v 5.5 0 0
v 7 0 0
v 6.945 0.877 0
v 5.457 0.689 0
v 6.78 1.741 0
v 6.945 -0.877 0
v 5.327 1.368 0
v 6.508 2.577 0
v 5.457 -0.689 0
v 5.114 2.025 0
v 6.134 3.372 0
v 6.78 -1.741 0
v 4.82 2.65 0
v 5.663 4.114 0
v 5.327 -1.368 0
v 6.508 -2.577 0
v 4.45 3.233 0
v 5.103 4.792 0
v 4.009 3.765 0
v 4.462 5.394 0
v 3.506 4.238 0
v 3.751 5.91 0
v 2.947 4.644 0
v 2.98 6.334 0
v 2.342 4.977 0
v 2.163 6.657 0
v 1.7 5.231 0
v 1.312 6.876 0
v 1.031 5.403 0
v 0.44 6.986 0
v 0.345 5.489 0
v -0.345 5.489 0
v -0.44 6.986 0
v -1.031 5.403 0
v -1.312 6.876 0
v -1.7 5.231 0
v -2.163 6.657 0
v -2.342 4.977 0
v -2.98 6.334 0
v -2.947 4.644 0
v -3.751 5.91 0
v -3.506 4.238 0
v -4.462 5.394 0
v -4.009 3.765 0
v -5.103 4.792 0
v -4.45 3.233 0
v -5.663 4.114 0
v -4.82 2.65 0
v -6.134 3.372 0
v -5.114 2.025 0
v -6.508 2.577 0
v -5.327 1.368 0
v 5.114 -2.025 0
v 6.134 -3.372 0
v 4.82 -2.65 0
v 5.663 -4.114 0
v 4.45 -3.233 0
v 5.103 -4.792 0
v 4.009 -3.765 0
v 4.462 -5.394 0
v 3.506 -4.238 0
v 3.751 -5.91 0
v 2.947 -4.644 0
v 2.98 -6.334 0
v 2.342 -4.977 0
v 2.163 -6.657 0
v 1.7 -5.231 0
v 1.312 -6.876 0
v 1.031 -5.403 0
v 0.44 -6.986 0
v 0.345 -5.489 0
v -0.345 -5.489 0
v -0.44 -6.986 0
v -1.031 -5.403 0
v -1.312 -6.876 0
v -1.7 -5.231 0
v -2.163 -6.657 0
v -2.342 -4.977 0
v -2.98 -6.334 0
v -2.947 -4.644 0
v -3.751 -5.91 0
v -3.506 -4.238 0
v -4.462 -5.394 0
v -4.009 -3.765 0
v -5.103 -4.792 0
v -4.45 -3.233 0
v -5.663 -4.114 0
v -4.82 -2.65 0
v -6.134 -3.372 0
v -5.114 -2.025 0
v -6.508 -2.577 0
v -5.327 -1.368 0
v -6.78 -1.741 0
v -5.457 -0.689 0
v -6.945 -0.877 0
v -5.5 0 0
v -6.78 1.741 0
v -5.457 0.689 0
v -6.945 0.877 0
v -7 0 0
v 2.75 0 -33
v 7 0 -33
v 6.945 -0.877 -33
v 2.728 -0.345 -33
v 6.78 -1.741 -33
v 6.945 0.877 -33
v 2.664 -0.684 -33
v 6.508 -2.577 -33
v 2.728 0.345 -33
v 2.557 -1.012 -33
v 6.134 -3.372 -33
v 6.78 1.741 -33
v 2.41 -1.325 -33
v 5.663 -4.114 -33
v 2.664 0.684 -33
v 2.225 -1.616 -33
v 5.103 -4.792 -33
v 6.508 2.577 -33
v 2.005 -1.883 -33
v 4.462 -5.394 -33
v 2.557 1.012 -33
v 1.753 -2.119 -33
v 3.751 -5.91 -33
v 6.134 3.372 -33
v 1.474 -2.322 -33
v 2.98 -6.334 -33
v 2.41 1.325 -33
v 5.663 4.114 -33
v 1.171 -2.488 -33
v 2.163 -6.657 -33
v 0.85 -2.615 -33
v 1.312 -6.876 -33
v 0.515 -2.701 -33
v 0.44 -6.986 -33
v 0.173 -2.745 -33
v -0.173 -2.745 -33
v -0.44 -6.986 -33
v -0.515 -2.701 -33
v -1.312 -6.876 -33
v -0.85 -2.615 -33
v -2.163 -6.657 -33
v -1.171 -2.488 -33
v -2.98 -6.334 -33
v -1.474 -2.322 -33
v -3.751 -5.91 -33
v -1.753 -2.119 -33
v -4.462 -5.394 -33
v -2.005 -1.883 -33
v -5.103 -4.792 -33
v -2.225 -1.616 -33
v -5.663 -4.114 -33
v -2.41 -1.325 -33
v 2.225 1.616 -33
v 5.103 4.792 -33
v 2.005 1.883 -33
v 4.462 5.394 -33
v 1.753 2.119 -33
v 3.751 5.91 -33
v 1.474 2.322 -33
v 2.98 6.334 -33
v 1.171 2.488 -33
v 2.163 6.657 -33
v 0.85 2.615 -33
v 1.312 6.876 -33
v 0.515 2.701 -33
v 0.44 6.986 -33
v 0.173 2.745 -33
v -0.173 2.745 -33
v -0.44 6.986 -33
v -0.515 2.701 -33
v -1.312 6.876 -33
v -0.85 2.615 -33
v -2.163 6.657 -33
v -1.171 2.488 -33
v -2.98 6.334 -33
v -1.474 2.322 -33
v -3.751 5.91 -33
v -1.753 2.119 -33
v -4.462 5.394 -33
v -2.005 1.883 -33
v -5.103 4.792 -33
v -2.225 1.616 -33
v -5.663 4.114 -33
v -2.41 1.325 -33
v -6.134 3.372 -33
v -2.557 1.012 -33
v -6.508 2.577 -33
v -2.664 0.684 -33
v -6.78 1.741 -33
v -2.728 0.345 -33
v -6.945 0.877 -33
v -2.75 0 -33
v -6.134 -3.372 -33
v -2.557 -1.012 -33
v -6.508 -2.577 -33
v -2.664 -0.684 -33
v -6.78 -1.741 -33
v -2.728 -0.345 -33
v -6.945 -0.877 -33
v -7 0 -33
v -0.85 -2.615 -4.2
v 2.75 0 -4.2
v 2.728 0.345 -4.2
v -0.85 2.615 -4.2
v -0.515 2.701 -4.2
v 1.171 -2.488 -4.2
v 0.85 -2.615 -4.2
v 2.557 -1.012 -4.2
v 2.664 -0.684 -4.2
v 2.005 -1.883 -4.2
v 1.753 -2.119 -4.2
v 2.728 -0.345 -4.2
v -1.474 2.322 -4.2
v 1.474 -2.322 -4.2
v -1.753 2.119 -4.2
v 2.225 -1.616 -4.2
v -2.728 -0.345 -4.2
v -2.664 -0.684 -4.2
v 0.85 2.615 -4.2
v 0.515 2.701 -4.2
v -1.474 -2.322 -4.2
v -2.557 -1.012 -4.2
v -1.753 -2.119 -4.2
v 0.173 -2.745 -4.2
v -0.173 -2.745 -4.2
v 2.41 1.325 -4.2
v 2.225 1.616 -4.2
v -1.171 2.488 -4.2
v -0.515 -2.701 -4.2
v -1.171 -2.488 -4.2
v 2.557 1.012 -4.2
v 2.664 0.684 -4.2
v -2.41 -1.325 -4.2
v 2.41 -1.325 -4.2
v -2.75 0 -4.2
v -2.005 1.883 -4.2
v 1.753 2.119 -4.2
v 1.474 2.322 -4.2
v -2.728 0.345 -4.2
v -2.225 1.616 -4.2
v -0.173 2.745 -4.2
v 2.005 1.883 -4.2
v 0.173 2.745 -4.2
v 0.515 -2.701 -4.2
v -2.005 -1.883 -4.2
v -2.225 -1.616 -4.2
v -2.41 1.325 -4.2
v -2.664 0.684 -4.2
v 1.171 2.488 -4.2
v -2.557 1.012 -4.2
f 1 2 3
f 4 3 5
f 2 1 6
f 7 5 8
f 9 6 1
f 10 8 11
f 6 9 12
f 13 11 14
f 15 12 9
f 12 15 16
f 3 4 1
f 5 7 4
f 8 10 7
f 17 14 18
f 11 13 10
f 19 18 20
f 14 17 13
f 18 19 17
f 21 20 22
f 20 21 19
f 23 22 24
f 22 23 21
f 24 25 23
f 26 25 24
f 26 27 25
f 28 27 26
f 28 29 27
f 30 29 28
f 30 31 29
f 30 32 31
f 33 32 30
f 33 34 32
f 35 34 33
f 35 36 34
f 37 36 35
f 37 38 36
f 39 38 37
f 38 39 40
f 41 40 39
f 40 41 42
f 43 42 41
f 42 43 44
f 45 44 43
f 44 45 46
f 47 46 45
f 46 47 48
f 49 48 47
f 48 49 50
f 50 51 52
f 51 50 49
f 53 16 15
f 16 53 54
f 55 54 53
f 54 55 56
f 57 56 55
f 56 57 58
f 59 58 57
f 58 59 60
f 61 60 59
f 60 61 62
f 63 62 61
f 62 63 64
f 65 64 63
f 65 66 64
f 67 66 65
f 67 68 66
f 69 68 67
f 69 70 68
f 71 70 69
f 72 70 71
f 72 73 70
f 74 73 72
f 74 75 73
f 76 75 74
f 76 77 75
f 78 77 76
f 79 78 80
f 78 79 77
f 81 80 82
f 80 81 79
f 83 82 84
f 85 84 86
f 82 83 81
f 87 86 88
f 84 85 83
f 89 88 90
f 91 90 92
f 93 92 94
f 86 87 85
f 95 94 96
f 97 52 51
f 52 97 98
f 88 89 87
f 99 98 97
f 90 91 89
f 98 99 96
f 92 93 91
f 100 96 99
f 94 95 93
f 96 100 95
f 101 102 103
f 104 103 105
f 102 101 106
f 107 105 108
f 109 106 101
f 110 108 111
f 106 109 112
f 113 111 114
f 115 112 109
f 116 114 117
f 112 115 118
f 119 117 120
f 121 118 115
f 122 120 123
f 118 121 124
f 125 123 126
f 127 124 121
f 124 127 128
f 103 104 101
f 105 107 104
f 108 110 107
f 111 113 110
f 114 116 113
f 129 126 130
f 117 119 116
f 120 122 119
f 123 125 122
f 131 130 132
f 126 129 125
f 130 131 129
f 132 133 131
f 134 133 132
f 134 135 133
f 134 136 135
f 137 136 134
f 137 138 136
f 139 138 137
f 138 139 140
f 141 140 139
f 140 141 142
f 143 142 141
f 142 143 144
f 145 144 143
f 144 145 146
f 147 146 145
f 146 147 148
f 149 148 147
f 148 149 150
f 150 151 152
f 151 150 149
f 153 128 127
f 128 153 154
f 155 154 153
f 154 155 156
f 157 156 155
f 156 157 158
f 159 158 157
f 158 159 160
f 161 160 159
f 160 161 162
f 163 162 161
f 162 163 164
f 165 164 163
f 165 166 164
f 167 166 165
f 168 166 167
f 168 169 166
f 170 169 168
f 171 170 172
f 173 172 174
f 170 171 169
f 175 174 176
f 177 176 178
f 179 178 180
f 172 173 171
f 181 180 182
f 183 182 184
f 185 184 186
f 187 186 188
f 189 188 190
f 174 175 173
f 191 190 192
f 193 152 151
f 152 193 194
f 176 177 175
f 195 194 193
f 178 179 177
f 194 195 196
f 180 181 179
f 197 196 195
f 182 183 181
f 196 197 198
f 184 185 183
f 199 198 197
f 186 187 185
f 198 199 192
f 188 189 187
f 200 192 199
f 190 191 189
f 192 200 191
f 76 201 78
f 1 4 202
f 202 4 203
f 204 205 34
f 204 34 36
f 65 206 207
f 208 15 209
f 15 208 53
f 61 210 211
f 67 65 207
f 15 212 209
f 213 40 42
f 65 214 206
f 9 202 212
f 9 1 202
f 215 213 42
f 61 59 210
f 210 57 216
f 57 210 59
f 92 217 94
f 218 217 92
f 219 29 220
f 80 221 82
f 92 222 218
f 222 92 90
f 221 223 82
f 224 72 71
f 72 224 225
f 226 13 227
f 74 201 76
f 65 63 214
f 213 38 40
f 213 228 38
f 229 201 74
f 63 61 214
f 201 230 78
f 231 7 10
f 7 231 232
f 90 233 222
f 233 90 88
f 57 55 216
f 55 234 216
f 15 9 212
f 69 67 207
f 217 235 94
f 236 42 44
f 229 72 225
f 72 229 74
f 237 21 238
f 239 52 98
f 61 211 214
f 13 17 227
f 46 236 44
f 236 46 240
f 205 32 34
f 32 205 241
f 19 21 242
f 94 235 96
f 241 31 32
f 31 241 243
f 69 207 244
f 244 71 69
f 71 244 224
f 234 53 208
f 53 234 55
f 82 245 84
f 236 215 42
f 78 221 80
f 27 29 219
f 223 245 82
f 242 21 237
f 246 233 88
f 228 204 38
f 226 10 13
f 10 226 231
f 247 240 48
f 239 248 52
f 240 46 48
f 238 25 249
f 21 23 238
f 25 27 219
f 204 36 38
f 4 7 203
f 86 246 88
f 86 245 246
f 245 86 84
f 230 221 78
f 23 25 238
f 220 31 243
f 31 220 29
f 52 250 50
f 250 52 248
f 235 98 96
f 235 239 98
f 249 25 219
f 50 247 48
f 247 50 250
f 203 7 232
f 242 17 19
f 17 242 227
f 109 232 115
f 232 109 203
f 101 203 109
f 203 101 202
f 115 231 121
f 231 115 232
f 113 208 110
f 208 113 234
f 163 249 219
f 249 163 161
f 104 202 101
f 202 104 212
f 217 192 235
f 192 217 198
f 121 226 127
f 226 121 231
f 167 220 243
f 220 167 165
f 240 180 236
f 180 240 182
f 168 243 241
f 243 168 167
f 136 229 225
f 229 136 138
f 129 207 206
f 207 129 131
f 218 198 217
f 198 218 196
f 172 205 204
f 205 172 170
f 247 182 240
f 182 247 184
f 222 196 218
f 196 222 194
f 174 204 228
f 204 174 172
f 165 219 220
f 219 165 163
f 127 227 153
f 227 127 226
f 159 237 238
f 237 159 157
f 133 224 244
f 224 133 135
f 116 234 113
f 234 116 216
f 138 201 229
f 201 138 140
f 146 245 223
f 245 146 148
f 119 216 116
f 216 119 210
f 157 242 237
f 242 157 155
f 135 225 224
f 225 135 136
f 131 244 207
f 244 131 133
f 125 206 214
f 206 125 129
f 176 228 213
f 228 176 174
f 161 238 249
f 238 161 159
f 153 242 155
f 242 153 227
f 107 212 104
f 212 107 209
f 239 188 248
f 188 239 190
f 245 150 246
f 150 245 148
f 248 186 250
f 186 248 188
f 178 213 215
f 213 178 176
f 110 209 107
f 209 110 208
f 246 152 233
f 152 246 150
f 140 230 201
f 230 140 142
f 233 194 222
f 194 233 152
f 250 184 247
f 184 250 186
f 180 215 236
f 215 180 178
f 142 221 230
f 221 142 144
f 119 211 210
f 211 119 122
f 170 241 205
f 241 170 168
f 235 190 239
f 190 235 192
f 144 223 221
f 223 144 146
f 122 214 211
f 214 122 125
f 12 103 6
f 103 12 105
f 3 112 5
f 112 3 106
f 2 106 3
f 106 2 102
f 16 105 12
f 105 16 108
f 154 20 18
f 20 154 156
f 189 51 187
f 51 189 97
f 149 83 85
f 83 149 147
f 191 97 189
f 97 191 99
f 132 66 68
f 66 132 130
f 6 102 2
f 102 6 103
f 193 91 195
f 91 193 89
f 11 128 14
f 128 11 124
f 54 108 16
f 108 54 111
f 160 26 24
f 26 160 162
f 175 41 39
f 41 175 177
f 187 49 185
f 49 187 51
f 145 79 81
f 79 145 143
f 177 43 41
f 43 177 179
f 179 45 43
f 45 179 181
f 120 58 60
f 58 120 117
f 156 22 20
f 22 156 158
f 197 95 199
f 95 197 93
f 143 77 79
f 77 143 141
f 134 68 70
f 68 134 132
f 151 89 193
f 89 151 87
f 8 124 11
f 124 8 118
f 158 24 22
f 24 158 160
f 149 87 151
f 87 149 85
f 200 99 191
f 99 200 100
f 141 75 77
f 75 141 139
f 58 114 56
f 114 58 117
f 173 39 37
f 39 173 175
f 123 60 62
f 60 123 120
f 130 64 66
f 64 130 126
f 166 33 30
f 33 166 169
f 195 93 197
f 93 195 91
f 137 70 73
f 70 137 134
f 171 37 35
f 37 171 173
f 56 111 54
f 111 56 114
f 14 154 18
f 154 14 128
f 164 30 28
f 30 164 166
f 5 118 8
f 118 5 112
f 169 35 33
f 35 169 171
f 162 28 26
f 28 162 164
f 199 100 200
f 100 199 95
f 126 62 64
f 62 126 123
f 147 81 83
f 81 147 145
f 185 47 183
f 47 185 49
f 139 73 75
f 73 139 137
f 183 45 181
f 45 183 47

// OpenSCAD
$fn = 50;


difference() {
	union() {
		translate(v = [0, 0, -33.0000000000]) {
			cylinder(h = 33, r = 7.0000000000);
		}
	}
	union() {
		translate(v = [0, 0, 0]) {
			rotate(a = [0, 0, 0]) {
				difference() {
					union() {
						#translate(v = [0, 0, -33.0000000000]) {
							cylinder(h = 33, r = 2.2500000000);
						}
						#translate(v = [0, 0, -4.2000000000]) {
							cylinder(h = 4.2000000000, r1 = 2.7500000000, r2 = 5.5000000000);
						}
						#translate(v = [0, 0, -33.0000000000]) {
							cylinder(h = 33, r = 2.7500000000);
						}
						#translate(v = [0, 0, -33.0000000000]) {
							cylinder(h = 33, r = 2.2500000000);
						}
					}
					union();
				}
			}
		}
	}
}
